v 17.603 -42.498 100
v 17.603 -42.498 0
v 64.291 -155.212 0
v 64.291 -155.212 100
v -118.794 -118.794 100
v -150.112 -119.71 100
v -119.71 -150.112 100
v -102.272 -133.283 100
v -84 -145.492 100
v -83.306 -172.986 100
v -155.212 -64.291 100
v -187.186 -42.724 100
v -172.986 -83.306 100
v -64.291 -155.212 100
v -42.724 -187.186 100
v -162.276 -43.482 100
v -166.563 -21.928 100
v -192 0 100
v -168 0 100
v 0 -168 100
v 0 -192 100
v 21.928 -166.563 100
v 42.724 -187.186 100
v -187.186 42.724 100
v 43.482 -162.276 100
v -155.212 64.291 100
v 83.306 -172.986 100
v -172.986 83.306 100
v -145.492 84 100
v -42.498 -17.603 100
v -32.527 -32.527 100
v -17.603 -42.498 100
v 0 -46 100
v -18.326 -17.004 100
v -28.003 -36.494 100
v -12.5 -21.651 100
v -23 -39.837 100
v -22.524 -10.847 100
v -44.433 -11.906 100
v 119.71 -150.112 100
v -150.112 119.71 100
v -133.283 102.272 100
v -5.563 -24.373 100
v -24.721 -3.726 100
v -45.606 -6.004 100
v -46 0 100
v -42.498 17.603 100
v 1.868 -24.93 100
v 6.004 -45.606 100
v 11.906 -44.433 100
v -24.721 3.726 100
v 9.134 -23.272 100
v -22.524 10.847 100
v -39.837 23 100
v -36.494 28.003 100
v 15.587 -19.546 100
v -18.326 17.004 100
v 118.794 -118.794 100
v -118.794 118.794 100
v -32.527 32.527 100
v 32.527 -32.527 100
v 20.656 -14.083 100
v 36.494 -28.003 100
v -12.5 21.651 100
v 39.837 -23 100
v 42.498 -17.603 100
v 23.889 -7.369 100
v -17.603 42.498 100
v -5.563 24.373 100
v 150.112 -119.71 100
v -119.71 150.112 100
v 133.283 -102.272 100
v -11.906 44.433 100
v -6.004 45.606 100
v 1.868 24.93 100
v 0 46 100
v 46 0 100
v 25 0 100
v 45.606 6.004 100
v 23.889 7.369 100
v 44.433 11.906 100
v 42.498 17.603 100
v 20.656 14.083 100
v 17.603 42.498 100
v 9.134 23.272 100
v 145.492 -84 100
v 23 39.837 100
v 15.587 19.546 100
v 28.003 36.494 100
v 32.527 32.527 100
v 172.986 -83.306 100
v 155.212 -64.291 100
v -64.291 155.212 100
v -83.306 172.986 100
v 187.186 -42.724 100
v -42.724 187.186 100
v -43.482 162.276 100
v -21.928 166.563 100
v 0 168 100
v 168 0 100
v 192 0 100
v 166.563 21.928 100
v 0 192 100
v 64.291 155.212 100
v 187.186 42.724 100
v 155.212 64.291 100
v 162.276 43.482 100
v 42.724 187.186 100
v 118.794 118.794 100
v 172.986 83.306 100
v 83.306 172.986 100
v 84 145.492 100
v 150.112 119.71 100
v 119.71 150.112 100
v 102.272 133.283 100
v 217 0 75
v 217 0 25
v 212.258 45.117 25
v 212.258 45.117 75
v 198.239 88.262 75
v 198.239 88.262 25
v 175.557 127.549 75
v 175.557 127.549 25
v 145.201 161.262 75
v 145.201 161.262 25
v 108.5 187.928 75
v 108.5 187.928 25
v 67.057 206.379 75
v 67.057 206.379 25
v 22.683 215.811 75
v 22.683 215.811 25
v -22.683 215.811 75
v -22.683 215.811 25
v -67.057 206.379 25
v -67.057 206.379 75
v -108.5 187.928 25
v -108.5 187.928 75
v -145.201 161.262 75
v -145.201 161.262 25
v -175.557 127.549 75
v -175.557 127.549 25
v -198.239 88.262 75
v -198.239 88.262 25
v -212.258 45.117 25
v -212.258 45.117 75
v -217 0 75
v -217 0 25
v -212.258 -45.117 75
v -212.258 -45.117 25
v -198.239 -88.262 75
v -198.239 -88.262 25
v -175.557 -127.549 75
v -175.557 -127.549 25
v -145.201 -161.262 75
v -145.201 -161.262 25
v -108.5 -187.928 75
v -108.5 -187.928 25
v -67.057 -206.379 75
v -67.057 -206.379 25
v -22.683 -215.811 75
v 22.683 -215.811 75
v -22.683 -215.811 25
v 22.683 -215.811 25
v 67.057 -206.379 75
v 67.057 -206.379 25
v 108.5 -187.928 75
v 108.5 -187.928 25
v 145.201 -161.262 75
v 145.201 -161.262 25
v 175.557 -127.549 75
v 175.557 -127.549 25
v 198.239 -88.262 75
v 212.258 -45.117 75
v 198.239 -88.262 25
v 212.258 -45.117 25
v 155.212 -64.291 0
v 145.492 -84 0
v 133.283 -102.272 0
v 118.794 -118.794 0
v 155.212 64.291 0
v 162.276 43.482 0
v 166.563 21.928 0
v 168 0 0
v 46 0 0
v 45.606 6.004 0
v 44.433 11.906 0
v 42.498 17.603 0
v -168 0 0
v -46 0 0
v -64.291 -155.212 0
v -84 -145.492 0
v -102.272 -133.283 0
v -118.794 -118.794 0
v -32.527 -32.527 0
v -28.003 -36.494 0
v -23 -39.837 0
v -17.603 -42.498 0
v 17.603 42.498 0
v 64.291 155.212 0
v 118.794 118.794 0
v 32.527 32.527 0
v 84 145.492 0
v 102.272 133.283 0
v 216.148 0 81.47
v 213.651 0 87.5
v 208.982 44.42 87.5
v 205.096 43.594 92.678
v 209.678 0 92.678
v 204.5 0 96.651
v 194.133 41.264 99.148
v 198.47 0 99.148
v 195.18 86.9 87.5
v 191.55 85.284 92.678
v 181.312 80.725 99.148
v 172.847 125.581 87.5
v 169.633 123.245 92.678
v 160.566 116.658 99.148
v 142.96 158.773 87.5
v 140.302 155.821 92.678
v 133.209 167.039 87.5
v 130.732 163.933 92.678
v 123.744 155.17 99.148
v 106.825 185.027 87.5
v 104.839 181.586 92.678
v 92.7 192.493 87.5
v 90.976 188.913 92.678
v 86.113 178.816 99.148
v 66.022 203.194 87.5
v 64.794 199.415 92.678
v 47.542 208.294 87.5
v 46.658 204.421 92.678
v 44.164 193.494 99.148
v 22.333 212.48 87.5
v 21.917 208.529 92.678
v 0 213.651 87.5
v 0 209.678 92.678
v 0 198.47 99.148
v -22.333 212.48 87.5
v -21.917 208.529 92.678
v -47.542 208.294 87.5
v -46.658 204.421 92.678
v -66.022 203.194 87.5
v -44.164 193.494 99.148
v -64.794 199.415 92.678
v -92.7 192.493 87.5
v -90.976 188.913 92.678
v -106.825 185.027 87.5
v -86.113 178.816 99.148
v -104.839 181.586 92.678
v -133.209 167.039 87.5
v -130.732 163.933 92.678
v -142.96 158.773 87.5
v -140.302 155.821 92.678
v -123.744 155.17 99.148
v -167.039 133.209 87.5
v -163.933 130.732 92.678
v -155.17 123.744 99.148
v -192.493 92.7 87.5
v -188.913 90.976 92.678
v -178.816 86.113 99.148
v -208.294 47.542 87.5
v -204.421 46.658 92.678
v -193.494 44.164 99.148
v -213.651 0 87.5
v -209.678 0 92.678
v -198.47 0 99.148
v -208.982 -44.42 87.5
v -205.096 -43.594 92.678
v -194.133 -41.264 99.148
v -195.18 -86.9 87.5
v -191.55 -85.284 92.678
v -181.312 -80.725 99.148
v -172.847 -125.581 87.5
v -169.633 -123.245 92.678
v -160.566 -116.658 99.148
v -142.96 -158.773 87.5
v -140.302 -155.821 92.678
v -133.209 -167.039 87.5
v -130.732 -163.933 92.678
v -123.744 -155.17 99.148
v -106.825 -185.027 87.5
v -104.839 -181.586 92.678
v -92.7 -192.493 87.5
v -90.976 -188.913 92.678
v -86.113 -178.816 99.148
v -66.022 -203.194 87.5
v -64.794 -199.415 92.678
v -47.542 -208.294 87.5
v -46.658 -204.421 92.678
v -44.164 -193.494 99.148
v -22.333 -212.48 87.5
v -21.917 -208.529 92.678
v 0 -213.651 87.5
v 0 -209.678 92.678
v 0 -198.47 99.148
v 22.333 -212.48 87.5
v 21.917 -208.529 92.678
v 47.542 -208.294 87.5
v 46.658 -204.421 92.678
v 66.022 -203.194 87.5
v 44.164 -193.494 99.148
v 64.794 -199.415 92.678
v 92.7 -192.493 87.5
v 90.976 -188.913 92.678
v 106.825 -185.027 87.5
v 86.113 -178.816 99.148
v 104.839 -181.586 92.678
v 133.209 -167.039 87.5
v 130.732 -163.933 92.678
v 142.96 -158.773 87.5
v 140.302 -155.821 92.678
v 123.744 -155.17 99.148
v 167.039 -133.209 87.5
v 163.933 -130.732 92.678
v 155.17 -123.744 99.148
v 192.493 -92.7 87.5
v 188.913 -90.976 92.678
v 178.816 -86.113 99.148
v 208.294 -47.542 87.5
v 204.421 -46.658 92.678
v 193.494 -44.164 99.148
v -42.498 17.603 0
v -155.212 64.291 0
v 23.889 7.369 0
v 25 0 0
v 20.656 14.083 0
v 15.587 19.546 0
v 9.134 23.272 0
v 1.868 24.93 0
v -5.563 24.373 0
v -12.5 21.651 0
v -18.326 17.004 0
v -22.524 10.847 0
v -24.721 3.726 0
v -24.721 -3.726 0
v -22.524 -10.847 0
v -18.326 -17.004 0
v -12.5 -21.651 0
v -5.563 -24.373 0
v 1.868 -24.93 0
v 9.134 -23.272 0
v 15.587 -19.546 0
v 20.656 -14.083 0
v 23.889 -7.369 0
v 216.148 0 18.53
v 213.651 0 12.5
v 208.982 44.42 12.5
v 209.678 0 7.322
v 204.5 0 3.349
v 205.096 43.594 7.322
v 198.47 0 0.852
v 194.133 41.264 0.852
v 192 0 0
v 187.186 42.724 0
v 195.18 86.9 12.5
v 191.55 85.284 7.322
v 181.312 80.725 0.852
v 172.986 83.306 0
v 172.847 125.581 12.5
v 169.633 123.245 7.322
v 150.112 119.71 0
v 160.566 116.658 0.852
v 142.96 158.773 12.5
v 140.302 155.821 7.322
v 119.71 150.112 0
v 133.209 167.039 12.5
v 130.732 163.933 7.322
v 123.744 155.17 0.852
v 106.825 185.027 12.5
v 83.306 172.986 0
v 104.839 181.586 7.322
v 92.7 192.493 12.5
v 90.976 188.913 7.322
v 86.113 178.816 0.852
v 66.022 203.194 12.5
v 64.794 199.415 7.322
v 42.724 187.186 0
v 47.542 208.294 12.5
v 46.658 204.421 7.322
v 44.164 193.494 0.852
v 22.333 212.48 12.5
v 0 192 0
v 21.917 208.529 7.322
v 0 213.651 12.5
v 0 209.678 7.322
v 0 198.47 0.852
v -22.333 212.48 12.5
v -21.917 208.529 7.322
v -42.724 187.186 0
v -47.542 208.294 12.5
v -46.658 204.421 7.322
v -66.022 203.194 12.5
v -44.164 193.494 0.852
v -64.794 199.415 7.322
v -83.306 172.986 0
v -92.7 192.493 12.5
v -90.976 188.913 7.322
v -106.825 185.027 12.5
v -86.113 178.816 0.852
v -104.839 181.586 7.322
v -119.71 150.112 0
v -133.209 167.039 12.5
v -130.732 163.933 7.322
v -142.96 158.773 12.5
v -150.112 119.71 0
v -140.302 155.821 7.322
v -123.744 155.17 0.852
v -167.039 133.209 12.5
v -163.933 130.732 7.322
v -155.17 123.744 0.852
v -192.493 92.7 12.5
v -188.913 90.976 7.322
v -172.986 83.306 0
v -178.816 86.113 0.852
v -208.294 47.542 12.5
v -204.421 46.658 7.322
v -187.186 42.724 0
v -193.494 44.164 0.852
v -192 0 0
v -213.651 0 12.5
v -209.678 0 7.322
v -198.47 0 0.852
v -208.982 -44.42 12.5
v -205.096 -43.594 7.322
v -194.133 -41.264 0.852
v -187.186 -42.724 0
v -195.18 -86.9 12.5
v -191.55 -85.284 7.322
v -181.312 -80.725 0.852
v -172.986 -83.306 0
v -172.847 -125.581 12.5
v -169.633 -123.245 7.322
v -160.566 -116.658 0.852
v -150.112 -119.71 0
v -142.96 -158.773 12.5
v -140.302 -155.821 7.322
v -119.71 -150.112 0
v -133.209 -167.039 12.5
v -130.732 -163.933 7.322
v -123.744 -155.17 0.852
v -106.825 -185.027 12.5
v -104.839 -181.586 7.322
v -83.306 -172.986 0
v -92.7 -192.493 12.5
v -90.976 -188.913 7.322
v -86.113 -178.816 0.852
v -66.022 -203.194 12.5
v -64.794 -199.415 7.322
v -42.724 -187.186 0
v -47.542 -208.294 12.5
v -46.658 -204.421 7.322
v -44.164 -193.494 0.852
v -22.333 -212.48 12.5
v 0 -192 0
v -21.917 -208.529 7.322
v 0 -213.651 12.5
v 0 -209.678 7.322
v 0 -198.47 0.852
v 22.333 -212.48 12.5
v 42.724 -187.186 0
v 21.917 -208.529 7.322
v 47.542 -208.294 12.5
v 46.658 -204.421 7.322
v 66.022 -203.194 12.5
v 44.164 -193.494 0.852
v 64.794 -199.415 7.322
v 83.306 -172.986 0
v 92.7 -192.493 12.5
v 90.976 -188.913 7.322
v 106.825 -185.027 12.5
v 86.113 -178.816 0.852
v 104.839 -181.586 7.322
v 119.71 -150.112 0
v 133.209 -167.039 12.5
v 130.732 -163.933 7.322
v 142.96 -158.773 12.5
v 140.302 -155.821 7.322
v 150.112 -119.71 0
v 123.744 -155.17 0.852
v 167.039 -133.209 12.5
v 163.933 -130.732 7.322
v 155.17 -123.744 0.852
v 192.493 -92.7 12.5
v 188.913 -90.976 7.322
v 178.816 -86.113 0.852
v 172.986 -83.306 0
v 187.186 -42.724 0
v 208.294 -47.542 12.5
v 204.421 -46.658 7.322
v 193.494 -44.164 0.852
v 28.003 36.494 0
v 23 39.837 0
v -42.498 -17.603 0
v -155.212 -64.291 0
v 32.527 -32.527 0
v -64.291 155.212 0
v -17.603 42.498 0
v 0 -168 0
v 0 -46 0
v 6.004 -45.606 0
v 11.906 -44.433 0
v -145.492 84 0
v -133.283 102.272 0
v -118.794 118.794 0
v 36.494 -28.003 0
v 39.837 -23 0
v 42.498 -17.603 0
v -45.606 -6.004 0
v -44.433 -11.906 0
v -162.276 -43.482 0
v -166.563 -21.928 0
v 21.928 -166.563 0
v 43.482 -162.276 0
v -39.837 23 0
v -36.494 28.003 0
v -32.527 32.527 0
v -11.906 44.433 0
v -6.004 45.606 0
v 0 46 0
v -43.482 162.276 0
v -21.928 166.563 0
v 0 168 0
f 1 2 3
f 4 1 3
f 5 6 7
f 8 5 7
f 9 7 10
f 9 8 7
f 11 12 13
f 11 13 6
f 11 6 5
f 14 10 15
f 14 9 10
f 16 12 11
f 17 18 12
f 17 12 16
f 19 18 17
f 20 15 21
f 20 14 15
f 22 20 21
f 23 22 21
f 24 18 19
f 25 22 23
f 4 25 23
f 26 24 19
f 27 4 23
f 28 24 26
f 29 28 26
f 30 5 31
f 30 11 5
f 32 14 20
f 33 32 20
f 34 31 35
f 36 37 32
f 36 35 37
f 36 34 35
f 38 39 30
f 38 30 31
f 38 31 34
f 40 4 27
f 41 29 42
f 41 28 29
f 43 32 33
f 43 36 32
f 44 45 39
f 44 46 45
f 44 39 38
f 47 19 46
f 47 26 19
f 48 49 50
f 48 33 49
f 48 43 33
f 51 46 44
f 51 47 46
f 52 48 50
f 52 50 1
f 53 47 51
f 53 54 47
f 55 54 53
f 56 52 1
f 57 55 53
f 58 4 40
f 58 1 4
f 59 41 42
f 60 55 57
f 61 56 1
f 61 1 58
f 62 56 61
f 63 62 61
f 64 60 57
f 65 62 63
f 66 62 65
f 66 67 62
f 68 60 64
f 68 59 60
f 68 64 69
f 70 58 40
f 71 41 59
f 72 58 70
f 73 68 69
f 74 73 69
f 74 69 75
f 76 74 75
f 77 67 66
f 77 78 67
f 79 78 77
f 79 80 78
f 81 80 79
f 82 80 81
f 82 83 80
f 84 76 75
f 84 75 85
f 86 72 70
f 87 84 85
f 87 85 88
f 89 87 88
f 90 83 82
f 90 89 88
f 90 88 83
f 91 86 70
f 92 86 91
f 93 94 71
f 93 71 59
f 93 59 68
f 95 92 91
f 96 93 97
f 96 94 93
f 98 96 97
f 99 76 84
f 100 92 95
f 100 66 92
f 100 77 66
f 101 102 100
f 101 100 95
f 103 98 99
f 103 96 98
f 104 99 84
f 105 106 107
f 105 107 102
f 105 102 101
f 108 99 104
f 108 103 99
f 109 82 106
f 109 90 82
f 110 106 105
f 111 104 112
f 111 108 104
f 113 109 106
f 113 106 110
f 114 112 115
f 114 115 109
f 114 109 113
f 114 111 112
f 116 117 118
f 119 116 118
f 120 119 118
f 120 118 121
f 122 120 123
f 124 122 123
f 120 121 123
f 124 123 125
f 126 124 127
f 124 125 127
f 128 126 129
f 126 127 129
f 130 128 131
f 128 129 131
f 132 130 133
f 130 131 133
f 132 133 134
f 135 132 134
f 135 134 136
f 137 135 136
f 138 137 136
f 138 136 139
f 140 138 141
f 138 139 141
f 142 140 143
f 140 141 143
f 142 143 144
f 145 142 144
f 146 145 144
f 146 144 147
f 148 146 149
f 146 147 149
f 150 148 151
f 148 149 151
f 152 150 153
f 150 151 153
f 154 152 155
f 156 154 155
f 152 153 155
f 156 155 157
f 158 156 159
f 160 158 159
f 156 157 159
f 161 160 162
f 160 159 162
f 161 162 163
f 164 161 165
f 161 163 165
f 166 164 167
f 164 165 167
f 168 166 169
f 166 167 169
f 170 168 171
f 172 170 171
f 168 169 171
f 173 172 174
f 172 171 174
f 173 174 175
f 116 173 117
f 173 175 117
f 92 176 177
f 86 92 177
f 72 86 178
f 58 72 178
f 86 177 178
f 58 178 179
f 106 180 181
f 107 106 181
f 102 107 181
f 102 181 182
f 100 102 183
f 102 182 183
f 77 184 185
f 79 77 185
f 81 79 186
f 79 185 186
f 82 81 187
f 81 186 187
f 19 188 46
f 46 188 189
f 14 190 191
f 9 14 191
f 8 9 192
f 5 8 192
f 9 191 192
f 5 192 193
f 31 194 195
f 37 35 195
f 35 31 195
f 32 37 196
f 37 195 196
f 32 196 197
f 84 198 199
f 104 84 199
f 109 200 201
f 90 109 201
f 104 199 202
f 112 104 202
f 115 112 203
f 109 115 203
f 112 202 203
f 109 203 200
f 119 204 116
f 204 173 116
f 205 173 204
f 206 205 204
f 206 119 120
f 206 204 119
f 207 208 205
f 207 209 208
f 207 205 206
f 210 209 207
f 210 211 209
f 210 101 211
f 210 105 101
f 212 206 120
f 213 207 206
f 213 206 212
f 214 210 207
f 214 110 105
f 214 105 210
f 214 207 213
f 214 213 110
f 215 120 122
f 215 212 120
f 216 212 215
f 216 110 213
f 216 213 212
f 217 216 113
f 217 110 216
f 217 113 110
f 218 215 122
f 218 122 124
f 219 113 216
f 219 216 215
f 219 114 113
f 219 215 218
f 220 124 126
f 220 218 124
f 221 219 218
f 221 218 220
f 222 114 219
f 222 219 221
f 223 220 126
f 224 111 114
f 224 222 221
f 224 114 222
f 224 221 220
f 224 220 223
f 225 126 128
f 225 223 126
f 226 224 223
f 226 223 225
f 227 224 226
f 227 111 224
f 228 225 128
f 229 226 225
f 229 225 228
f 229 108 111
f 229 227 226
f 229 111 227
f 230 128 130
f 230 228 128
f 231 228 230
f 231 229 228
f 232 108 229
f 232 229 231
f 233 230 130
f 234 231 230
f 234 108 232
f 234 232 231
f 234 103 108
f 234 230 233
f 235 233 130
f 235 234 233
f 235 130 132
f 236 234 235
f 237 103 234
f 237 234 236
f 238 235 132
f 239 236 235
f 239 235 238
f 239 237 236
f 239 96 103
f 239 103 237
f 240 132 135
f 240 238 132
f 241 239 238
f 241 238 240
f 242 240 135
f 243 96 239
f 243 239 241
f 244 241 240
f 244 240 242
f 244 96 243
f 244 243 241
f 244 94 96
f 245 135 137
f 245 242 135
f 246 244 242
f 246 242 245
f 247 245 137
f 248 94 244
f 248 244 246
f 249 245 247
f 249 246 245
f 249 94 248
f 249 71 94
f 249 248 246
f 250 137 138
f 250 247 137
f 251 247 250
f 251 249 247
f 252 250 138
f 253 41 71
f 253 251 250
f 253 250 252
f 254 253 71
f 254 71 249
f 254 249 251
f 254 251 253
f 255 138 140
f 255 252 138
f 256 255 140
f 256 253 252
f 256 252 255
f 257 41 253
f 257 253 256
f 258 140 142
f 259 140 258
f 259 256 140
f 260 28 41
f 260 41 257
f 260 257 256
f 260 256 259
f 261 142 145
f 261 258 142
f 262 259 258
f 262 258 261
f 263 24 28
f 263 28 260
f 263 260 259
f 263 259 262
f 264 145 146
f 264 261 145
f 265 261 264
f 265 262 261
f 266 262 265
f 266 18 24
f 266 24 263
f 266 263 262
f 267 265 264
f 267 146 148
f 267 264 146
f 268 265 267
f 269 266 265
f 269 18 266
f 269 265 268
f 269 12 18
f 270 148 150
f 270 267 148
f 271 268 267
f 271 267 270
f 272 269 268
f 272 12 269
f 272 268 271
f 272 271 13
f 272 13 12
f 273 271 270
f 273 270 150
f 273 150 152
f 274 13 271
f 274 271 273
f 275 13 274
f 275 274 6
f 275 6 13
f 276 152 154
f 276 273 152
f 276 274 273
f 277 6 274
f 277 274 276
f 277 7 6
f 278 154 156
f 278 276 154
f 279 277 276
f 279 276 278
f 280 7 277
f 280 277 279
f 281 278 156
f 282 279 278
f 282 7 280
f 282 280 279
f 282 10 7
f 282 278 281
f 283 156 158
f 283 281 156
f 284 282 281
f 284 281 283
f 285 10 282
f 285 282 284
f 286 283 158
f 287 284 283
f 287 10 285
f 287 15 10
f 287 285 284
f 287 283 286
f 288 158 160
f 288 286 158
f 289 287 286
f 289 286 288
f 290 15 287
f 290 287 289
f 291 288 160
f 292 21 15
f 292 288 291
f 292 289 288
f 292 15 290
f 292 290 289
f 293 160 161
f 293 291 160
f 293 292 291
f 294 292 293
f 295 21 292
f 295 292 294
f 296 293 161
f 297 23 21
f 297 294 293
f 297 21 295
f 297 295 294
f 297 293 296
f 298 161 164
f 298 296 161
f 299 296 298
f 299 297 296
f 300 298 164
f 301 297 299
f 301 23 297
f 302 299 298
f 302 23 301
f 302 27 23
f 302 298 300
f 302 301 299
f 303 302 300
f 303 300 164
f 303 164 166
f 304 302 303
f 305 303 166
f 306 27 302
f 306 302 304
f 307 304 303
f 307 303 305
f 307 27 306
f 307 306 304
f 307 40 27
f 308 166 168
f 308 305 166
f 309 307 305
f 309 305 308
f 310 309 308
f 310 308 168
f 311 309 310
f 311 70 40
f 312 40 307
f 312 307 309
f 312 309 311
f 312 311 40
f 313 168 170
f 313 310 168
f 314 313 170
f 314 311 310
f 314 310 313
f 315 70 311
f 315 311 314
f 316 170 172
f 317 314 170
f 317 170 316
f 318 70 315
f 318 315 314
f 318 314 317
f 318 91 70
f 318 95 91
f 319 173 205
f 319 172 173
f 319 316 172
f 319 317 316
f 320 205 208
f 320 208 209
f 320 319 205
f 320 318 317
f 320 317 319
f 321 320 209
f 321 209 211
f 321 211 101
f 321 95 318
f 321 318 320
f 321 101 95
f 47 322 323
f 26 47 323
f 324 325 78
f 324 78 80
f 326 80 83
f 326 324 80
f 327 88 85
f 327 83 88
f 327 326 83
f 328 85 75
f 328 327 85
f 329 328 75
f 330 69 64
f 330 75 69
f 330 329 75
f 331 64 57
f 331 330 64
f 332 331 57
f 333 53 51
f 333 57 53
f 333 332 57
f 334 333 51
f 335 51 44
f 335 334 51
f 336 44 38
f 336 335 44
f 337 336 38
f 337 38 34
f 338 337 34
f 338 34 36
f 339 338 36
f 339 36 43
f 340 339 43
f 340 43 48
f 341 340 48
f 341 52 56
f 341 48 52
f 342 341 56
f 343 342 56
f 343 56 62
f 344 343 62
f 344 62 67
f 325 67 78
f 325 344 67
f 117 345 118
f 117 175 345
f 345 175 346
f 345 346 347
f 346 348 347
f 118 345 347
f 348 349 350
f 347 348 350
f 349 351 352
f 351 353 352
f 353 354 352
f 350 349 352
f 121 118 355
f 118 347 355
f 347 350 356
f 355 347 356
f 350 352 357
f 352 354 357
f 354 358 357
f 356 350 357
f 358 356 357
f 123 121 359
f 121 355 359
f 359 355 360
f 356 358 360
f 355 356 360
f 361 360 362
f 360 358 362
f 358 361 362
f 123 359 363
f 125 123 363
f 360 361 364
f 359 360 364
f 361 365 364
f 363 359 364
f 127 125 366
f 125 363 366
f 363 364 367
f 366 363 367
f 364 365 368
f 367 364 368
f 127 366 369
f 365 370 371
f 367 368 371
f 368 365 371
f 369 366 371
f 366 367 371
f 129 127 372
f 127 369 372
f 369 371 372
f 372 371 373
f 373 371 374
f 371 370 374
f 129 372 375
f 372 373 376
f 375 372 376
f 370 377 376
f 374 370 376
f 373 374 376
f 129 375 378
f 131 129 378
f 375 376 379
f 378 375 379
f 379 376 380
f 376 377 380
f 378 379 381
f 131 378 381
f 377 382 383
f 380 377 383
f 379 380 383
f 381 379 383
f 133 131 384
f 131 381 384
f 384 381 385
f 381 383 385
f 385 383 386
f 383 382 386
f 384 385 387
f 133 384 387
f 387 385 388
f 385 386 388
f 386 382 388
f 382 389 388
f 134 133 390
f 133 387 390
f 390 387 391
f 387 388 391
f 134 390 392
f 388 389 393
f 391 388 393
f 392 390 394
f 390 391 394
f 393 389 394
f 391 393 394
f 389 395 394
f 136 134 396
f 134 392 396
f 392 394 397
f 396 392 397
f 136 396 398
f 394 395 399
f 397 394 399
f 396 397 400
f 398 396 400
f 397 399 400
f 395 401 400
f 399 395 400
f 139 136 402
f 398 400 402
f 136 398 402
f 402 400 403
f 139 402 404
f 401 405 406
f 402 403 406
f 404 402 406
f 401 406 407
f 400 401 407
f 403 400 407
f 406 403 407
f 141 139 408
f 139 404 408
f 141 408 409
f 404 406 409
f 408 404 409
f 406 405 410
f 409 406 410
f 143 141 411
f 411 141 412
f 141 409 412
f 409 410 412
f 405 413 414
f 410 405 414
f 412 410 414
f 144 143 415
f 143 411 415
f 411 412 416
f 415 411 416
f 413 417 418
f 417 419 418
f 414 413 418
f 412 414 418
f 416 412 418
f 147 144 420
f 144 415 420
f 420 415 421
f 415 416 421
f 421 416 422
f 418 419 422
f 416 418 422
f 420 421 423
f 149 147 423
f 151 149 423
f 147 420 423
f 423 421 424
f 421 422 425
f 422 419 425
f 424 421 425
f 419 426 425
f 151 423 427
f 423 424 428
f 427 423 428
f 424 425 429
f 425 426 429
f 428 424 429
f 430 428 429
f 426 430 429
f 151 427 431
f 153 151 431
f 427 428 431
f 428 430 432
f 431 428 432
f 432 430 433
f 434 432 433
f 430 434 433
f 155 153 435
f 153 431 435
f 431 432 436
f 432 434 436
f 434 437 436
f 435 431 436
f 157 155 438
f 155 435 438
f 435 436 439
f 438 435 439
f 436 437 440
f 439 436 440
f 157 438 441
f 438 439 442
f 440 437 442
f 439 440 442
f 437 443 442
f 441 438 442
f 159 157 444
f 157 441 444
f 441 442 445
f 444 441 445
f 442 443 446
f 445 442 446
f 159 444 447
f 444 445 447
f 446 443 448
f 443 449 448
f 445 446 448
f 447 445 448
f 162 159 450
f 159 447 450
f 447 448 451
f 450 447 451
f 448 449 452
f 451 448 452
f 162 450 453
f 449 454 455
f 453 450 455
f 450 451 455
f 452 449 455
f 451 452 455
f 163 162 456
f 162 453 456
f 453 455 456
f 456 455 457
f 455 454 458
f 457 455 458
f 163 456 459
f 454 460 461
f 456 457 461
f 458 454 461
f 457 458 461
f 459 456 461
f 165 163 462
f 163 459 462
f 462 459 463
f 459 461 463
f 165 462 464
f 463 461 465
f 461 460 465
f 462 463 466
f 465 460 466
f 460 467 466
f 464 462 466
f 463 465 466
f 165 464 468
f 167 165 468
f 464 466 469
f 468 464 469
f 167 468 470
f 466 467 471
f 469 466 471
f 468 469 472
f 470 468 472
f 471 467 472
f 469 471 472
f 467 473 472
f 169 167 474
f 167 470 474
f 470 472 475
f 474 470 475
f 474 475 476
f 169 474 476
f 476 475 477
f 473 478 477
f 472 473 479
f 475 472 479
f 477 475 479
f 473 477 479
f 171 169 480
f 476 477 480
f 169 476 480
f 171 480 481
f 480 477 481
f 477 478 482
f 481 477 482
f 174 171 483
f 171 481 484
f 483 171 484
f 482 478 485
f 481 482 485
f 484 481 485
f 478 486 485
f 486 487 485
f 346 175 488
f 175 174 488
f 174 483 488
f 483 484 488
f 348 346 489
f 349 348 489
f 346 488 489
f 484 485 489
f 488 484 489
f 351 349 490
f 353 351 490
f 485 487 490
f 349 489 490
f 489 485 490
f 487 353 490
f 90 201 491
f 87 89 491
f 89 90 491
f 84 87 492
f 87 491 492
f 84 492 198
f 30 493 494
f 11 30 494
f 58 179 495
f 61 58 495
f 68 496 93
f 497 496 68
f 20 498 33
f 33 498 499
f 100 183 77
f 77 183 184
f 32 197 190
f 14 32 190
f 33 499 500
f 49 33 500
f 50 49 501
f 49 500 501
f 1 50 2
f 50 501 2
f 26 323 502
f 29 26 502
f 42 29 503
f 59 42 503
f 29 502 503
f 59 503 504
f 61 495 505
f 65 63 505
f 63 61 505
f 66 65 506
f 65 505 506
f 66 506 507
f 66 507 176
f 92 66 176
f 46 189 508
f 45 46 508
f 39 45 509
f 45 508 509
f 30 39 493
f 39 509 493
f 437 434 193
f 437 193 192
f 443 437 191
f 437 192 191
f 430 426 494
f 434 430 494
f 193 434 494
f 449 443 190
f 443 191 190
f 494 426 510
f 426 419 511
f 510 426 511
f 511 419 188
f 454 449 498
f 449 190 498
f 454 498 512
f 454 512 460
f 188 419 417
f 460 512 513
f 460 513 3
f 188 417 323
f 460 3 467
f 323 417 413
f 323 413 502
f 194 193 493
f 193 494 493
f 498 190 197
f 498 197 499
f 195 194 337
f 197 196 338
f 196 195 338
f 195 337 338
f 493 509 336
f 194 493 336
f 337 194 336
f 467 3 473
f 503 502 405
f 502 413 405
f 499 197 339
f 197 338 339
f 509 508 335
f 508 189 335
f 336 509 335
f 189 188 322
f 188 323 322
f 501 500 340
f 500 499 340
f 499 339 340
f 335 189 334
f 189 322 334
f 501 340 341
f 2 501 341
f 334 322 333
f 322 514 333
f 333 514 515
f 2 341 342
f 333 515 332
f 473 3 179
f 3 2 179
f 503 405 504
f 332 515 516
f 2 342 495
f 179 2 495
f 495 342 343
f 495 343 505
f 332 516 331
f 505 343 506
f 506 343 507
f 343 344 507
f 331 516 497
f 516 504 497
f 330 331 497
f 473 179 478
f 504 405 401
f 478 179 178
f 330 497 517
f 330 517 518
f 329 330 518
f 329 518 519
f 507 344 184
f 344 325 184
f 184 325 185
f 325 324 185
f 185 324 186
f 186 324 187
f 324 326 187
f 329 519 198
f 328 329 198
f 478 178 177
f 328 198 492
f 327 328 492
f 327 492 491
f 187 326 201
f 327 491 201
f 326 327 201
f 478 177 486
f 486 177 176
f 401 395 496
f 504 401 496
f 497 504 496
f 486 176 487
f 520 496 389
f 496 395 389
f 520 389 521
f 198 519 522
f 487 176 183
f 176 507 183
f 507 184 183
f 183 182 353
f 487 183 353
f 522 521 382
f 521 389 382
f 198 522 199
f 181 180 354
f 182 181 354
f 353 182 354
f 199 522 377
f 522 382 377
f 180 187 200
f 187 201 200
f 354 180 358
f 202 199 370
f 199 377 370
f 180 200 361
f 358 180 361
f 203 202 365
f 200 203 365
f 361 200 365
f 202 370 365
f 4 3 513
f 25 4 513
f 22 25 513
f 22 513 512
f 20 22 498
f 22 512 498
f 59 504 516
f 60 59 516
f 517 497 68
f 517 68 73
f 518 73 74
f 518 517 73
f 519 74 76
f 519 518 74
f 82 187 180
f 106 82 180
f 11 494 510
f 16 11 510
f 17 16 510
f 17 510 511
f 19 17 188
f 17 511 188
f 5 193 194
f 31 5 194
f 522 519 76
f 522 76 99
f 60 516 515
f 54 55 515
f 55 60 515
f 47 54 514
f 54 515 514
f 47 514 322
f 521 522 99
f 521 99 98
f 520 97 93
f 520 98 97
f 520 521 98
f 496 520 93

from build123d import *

# Parameters (mm, degrees)
SKETCH1_R               = 217
BOSS_EXTRUDE1_DEPTH     = 100
FILLET1_R               = 25
FILLET2_R               = 25
CUT_EXTRUDE4_DEPTH      = 20000
CUT_EXTRUDE4_DEPTH_BACK = 20000
CUT_EXTRUDE5_DEPTH      = 20000
CUT_EXTRUDE5_DEPTH_BACK = 20000
SKETCH8_R               = 25


with BuildPart() as part:
    # Sketch1 → Boss-Extrude1 (new body)
    with BuildSketch(Plane.XY):
        Circle(SKETCH1_R)
    extrude(amount=BOSS_EXTRUDE1_DEPTH)

    # Fillet1
    fillet1_edges = [part.edges().sort_by_distance(p)[0] for p in [
        (-217, 0, 100),
    ]]
    fillet(fillet1_edges, radius=FILLET1_R)

    # Fillet2
    fillet2_edges = [part.edges().sort_by_distance(p)[0] for p in [
        (-217, 0, 0),
    ]]
    fillet(fillet2_edges, radius=FILLET2_R)

    # Sketch3 → Cut-Extrude4 (cut, two sides: drawn at the far end of the back side and taken through both)
    with BuildSketch(Plane.XY.offset(-CUT_EXTRUDE4_DEPTH_BACK)):
        with BuildLine():
            ThreePointArc((-46, 0), (-45.116122899, -8.974154813), (-42.498458496, -17.603437889))
            Line((-42.498458496, -17.603437889), (-155.211761462, -64.290816637))
            ThreePointArc((-155.211761462, -64.290816637), (-164.771927108, -32.775174099), (-168, 0))
            Line((-168, 0), (-46, 0))
        make_face()
        with BuildLine():
            ThreePointArc((0, -46), (8.974154813, -45.116122899), (17.603437889, -42.498458496))
            Line((17.603437889, -42.498458496), (64.290816637, -155.211761462))
            ThreePointArc((64.290816637, -155.211761462), (32.775174099, -164.771927108), (0, -168))
            Line((0, -168), (0, -46))
        make_face()
        with BuildLine():
            ThreePointArc((32.526911935, -32.526911935), (38.247602166, -25.556230719), (42.498458496, -17.603437889))
            Line((42.498458496, -17.603437889), (155.211761462, -64.290816637))
            ThreePointArc((155.211761462, -64.290816637), (139.686894867, -93.335799147), (118.793939239, -118.793939239))
            Line((118.793939239, -118.793939239), (32.526911935, -32.526911935))
        make_face()
        with BuildLine():
            ThreePointArc((46, 0), (45.116122899, 8.974154813), (42.498458496, 17.603437889))
            Line((42.498458496, 17.603437889), (155.211761462, 64.290816637))
            ThreePointArc((155.211761462, 64.290816637), (164.771927108, 32.775174099), (168, 0))
            Line((168, 0), (46, 0))
        make_face()
        with BuildLine():
            ThreePointArc((32.526911935, 32.526911935), (25.556230719, 38.247602166), (17.603437889, 42.498458496))
            Line((17.603437889, 42.498458496), (64.290816637, 155.211761462))
            ThreePointArc((64.290816637, 155.211761462), (93.335799147, 139.686894867), (118.793939239, 118.793939239))
            Line((118.793939239, 118.793939239), (32.526911935, 32.526911935))
        make_face()
        with BuildLine():
            Line((0, 46), (0, 168))
            ThreePointArc((0, 168), (-32.775174099, 164.771927108), (-64.290816637, 155.211761462))
            Line((-64.290816637, 155.211761462), (-17.603437889, 42.498458496))
            ThreePointArc((-17.603437889, 42.498458496), (-8.974154813, 45.116122899), (0, 46))
        make_face()
        with BuildLine():
            Line((-42.498458496, 17.603437889), (-155.211761462, 64.290816637))
            ThreePointArc((-155.211761462, 64.290816637), (-139.686894867, 93.335799147), (-118.793939239, 118.793939239))
            Line((-118.793939239, 118.793939239), (-32.526911935, 32.526911935))
            ThreePointArc((-32.526911935, 32.526911935), (-38.247602166, 25.556230719), (-42.498458496, 17.603437889))
        make_face()
        with BuildLine():
            Line((-17.603437889, -42.498458496), (-64.290816637, -155.211761462))
            ThreePointArc((-64.290816637, -155.211761462), (-93.335799147, -139.686894867), (-118.793939239, -118.793939239))
            Line((-118.793939239, -118.793939239), (-32.526911935, -32.526911935))
            ThreePointArc((-32.526911935, -32.526911935), (-25.556230719, -38.247602166), (-17.603437889, -42.498458496))
        make_face()
    extrude(amount=CUT_EXTRUDE4_DEPTH + CUT_EXTRUDE4_DEPTH_BACK, mode=Mode.SUBTRACT)

    # Sketch8 → Cut-Extrude5 (cut, two sides: drawn at the far end of the back side and taken through both)
    with BuildSketch(Plane.XY.offset(-CUT_EXTRUDE5_DEPTH_BACK)):
        Circle(SKETCH8_R)
    extrude(amount=CUT_EXTRUDE5_DEPTH + CUT_EXTRUDE5_DEPTH_BACK, mode=Mode.SUBTRACT)


solid = part.part
